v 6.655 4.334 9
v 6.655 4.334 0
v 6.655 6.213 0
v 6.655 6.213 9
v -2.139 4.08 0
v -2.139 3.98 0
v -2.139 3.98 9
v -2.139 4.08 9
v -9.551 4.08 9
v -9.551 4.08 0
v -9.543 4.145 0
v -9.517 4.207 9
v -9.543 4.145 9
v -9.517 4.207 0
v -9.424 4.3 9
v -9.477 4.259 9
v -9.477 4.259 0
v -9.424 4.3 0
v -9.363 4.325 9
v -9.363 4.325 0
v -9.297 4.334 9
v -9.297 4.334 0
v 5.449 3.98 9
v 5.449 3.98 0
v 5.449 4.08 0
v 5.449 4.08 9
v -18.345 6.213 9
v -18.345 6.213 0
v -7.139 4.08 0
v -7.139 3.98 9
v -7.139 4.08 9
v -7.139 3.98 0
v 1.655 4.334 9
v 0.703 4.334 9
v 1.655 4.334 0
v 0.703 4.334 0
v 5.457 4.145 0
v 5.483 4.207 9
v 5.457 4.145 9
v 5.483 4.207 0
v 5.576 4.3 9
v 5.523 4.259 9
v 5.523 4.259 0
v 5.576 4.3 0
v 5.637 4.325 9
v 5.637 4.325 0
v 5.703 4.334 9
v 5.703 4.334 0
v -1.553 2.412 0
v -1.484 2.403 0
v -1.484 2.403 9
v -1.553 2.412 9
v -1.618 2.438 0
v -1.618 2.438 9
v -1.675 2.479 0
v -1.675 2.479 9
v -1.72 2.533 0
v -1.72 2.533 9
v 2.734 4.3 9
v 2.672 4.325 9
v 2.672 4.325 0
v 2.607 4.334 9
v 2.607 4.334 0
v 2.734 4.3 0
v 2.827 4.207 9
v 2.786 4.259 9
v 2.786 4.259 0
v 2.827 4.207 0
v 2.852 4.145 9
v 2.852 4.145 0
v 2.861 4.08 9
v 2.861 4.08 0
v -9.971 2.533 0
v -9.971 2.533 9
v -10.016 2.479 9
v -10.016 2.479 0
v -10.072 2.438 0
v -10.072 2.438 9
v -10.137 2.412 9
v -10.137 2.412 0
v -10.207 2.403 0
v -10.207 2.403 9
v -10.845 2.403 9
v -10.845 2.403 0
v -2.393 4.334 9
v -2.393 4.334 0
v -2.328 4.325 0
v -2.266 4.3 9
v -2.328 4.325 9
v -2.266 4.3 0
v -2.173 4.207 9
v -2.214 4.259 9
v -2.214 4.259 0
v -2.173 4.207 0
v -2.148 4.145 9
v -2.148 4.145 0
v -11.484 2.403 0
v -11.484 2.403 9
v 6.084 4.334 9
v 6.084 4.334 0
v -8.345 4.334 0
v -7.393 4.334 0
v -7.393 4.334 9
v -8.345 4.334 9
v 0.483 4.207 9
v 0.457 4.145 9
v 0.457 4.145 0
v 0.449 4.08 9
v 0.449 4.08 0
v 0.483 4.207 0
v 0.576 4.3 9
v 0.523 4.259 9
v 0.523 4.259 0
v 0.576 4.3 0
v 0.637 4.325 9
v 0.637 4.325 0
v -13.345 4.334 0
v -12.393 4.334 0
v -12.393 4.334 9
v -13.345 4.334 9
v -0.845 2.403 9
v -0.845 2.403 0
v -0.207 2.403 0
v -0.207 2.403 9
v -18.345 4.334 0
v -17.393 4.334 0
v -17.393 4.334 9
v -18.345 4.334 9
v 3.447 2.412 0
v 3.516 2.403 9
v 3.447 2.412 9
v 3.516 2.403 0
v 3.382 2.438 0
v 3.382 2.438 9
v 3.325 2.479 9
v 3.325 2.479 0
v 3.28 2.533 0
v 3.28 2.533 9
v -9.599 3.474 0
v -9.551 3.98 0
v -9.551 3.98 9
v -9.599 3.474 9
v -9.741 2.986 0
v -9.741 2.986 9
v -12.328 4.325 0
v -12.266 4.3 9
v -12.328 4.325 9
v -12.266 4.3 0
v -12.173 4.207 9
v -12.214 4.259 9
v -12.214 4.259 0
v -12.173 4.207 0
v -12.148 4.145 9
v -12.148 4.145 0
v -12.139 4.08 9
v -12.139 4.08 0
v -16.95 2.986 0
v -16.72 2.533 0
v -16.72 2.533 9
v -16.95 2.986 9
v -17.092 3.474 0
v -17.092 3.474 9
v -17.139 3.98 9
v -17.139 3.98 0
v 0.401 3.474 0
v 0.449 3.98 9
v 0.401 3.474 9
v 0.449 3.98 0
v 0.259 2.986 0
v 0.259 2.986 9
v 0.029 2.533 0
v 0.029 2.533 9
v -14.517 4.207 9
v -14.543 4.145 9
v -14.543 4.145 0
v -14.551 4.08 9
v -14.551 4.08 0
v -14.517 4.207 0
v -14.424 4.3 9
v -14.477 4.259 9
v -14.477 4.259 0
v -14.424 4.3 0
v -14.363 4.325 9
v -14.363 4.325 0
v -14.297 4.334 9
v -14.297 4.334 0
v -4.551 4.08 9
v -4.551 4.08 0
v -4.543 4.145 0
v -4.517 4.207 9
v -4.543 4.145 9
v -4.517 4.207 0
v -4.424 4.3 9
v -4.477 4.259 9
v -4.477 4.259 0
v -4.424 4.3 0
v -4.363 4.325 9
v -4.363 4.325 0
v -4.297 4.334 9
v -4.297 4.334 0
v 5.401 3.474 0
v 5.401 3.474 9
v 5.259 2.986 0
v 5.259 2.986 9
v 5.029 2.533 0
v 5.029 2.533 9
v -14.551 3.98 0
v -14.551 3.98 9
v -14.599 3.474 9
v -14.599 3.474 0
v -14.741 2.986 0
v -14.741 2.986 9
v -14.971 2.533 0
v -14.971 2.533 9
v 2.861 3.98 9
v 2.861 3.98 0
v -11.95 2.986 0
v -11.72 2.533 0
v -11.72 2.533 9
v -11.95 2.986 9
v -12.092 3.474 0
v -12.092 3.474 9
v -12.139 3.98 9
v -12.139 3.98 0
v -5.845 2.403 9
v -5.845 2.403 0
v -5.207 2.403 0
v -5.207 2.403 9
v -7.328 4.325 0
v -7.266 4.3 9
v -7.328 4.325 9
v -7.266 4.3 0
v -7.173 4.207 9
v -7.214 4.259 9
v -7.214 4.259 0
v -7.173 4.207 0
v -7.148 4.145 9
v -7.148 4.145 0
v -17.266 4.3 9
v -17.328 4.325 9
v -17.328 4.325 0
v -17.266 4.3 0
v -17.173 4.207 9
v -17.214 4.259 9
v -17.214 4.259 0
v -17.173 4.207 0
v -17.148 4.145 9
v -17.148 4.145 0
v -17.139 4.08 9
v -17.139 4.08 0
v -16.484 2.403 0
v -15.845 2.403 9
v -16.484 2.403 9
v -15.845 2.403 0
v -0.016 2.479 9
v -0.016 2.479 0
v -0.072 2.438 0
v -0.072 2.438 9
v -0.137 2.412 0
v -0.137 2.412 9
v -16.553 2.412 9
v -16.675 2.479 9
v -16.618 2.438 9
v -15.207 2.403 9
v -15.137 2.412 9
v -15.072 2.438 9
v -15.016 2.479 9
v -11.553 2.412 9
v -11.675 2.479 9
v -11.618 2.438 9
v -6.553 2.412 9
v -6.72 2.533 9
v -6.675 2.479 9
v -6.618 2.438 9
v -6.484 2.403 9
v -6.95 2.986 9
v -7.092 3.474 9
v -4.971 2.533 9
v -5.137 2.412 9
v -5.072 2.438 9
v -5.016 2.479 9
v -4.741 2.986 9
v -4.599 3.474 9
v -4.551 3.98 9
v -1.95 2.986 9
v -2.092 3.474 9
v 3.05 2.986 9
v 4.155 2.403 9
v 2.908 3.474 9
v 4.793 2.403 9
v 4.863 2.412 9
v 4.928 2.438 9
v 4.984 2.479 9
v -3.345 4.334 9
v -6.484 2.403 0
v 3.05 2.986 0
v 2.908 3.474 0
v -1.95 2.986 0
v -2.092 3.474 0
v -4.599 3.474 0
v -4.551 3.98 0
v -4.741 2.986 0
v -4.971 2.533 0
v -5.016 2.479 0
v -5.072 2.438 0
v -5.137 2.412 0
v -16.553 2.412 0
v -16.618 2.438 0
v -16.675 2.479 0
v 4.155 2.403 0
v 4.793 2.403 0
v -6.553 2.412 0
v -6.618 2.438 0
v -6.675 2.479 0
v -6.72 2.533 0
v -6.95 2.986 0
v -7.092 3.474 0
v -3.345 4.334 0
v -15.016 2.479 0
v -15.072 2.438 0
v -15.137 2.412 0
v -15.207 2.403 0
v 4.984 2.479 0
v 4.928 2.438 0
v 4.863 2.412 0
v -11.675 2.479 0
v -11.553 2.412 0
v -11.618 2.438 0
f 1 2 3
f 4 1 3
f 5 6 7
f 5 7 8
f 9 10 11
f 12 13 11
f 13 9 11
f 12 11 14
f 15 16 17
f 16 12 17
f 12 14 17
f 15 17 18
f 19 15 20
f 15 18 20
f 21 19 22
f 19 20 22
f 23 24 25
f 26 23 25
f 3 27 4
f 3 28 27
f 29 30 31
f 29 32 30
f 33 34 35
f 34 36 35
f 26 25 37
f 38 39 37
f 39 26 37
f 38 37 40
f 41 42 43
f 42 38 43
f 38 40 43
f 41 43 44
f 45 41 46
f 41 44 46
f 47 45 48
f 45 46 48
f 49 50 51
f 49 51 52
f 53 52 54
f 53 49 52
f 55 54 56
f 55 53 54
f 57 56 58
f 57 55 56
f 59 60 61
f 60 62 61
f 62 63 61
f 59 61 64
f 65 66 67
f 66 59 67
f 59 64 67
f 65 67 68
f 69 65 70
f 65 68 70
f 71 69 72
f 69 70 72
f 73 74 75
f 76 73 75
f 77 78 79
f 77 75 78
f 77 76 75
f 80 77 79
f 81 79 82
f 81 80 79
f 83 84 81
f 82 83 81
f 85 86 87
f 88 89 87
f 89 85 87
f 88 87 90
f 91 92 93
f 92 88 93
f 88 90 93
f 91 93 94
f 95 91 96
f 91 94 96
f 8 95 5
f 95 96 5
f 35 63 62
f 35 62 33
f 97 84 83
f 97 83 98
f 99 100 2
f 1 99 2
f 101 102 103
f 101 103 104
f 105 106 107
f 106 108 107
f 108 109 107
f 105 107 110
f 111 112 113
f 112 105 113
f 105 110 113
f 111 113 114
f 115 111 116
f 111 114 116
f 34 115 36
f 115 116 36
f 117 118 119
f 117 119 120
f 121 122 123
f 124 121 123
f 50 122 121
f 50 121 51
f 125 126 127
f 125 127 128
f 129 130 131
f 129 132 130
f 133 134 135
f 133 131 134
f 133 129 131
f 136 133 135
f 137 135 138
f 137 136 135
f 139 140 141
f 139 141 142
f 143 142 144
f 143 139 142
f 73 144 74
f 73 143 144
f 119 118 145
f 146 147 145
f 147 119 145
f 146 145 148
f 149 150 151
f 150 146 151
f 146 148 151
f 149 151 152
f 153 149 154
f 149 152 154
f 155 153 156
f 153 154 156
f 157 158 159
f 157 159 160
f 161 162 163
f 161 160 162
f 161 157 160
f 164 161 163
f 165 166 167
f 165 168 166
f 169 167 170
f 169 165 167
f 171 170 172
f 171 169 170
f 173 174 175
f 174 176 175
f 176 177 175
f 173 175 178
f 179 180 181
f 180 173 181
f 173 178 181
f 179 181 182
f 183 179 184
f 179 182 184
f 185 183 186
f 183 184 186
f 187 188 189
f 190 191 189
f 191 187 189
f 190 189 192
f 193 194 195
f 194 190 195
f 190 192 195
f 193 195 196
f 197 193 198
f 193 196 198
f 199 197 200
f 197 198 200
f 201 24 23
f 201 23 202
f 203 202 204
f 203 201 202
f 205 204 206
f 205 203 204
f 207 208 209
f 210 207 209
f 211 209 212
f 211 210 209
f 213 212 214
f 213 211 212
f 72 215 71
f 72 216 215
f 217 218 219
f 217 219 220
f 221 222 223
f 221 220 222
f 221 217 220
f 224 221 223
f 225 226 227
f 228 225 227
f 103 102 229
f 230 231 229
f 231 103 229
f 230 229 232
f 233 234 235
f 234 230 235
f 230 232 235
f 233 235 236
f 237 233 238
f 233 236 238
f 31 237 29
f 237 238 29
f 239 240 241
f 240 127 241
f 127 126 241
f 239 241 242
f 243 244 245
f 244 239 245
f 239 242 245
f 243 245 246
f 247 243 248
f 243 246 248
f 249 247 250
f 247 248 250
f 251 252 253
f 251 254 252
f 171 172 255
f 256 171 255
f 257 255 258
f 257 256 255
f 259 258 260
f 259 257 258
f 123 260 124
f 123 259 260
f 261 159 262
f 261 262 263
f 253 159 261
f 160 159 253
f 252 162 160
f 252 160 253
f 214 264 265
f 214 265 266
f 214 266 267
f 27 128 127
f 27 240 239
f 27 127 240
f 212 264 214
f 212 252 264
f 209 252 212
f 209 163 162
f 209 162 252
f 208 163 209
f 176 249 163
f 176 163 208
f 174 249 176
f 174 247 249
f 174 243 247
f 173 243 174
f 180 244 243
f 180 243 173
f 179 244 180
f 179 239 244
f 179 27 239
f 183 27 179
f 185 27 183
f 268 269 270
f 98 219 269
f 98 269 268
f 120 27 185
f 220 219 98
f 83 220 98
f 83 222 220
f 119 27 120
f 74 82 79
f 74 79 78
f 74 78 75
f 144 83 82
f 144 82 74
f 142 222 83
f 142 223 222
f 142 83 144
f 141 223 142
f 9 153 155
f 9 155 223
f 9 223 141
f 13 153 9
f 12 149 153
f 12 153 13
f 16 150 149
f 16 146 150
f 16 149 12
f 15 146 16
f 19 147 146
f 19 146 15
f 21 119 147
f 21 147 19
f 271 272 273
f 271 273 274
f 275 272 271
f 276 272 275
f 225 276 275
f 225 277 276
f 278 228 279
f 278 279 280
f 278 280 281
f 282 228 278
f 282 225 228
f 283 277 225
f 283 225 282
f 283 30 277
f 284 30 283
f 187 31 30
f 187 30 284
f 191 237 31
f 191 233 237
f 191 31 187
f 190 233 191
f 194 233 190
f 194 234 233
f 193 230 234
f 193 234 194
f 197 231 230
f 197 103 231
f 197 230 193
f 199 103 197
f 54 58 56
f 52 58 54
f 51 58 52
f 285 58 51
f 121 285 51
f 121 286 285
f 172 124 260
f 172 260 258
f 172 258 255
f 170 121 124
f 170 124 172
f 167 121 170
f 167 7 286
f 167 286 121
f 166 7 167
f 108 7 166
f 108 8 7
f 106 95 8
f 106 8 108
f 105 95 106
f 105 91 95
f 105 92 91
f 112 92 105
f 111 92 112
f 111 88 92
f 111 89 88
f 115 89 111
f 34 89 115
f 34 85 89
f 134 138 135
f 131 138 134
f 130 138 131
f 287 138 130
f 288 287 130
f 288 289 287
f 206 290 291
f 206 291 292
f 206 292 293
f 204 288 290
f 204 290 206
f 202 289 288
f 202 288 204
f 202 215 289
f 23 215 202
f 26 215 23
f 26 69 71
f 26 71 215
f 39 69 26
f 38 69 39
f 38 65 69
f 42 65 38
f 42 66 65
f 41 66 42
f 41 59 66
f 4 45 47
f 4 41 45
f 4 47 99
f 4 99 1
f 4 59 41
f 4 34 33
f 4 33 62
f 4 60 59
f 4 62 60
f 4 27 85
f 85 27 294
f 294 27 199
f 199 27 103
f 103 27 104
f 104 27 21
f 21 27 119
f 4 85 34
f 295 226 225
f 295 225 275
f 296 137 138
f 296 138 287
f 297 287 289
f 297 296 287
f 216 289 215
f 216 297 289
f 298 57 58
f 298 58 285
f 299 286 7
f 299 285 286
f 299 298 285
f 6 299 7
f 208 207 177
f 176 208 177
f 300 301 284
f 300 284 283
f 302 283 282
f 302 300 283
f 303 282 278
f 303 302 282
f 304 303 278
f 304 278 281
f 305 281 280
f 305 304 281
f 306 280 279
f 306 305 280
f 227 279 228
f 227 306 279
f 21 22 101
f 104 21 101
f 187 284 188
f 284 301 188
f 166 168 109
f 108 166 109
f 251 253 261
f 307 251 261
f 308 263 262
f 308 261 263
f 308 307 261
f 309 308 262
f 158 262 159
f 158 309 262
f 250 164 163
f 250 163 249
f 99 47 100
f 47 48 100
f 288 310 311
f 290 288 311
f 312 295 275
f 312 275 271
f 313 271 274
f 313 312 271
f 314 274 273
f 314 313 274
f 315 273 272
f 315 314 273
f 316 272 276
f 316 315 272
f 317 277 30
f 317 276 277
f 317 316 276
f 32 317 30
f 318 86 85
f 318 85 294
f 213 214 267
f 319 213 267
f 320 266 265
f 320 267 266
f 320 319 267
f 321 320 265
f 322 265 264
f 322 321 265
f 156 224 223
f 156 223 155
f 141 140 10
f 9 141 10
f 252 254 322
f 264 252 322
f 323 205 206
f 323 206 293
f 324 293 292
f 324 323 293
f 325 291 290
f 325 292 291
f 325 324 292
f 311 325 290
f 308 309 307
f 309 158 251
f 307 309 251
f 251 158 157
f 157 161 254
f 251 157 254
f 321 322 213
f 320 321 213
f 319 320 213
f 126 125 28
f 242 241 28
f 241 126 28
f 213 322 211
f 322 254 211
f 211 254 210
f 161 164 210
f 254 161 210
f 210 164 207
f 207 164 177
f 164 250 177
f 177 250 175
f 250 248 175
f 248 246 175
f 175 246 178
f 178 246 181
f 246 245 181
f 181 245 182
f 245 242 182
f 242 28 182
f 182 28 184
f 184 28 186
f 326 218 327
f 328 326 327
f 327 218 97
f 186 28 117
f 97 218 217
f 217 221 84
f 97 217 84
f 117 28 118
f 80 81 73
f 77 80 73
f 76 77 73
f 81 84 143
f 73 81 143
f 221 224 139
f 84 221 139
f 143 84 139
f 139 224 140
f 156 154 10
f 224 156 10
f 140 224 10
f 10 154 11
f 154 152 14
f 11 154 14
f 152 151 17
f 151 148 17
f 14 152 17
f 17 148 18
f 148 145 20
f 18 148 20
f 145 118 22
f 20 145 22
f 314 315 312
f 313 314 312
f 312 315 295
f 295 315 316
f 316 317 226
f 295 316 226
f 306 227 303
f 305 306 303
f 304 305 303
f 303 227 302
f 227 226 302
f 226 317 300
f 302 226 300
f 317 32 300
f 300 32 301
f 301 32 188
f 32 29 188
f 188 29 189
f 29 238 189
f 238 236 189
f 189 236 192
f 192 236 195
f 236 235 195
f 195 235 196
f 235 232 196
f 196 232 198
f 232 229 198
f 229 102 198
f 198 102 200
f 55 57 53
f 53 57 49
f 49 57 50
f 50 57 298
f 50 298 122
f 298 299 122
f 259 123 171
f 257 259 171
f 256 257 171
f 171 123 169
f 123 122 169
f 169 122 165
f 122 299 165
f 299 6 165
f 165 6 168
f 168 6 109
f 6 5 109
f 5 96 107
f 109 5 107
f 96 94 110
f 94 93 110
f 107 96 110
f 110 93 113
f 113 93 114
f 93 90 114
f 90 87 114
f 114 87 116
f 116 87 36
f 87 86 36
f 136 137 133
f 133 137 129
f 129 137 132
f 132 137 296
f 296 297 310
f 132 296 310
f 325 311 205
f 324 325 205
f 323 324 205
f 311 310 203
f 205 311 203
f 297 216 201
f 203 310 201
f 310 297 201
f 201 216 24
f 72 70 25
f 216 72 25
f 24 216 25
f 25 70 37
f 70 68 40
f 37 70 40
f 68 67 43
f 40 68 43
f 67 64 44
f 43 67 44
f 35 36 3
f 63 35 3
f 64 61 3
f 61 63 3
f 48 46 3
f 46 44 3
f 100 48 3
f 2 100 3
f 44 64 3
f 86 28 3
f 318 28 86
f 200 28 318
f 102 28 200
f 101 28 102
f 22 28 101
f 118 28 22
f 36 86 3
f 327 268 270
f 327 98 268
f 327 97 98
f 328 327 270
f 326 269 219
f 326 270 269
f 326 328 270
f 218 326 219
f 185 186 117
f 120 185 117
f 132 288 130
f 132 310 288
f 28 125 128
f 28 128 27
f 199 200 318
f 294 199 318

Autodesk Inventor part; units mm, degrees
ref_plane "YZ Plane" through (0, 0, 0) normal (1, 0, 0) x (0, 1, 0)
ref_plane "XZ Plane" through (0, 0, 0) normal (0, 1, 0) x (-1, 0, 0)
ref_plane "XY Plane" through (0, 0, 0) normal (0, 0, 1) x (1, 0, 0)
sketch "Sketch1" plane through (0, 0, 0) normal (0, 0, 1) x (1, 0, 0)
  line L0 (-14.2973, 4.3336) -> (-13.3453, 4.3336)
  line L1 (-18.3453, 6.2132) -> (6.6546, 6.2132)
  arc A0 (-14.971, 2.5331) -> (-14.5513, 3.9796) centre (-17.2541, 3.9796) ccw
  arc A1 (-17.1394, 3.9796) -> (-16.7197, 2.5331) centre (-14.4366, 3.9796) ccw
  arc A2 (-15.207, 2.4032) -> (-14.971, 2.5331) centre (-15.207, 2.6826) ccw
  arc A3 (-16.7197, 2.5331) -> (-16.4837, 2.4032) centre (-16.4837, 2.6826) ccw
  line L2 (-15.8453, 2.4032) -> (-15.207, 2.4032)
  line L3 (-15.8453, 2.4032) -> (-16.4837, 2.4032)
  arc A4 (-14.2973, 4.3336) -> (-14.5513, 4.0796) centre (-14.2973, 4.0796) ccw
  arc A5 (-17.1394, 4.0796) -> (-17.3934, 4.3336) centre (-17.3934, 4.0796) ccw
  line L4 (-18.3453, 4.3336) -> (-18.3453, 6.2132)
  line L5 (-14.5513, 3.9796) -> (-14.5513, 4.0796)
  line L6 (-17.3934, 4.3336) -> (-18.3453, 4.3336)
  line L7 (-17.1394, 3.9796) -> (-17.1394, 4.0796)
  arc A6 (5.029, 2.5331) -> (5.4487, 3.9796) centre (2.7459, 3.9796) ccw
  arc A7 (2.8606, 3.9796) -> (3.2803, 2.5331) centre (5.5634, 3.9796) ccw
  arc A8 (0.029, 2.5331) -> (0.4487, 3.9796) centre (-2.2541, 3.9796) ccw
  arc A9 (-2.1394, 3.9796) -> (-1.7197, 2.5331) centre (0.5634, 3.9796) ccw
  arc A10 (-4.971, 2.5331) -> (-4.5513, 3.9796) centre (-7.2541, 3.9796) ccw
  arc A11 (-7.1394, 3.9796) -> (-6.7197, 2.5331) centre (-4.4366, 3.9796) ccw
  arc A12 (-9.971, 2.5331) -> (-9.5513, 3.9796) centre (-12.2541, 3.9796) ccw
  arc A13 (-12.1394, 3.9796) -> (-11.7197, 2.5331) centre (-9.4366, 3.9796) ccw
  arc A14 (-10.207, 2.4032) -> (-9.971, 2.5331) centre (-10.207, 2.6826) ccw
  line L8 (-10.8453, 2.4032) -> (-10.207, 2.4032)
  arc A15 (-11.7197, 2.5331) -> (-11.4837, 2.4032) centre (-11.4837, 2.6826) ccw
  line L9 (-10.8453, 2.4032) -> (-11.4837, 2.4032)
  arc A16 (-5.207, 2.4032) -> (-4.971, 2.5331) centre (-5.207, 2.6826) ccw
  line L10 (-5.8453, 2.4032) -> (-5.207, 2.4032)
  arc A17 (-6.7197, 2.5331) -> (-6.4837, 2.4032) centre (-6.4837, 2.6826) ccw
  line L11 (-5.8453, 2.4032) -> (-6.4837, 2.4032)
  arc A18 (-0.207, 2.4032) -> (0.029, 2.5331) centre (-0.207, 2.6826) ccw
  line L12 (-0.8454, 2.4032) -> (-0.207, 2.4032)
  arc A19 (-1.7197, 2.5331) -> (-1.4837, 2.4032) centre (-1.4837, 2.6826) ccw
  line L13 (-0.8454, 2.4032) -> (-1.4837, 2.4032)
  arc A20 (4.793, 2.4032) -> (5.029, 2.5331) centre (4.793, 2.6826) ccw
  line L14 (4.1546, 2.4032) -> (4.793, 2.4032)
  arc A21 (3.2803, 2.5331) -> (3.5163, 2.4032) centre (3.5163, 2.6826) ccw
  line L15 (4.1546, 2.4032) -> (3.5163, 2.4032)
  line L16 (-2.3934, 4.3336) -> (-3.3454, 4.3336)
  line L17 (-9.2973, 4.3336) -> (-8.3453, 4.3336)
  line L18 (-9.5513, 3.9796) -> (-9.5513, 4.0796)
  arc A22 (-9.2973, 4.3336) -> (-9.5513, 4.0796) centre (-9.2973, 4.0796) ccw
  line L19 (-12.1394, 3.9796) -> (-12.1394, 4.0796)
  arc A23 (-12.1394, 4.0796) -> (-12.3934, 4.3336) centre (-12.3934, 4.0796) ccw
  line L20 (-12.3934, 4.3336) -> (-13.3453, 4.3336)
  line L21 (-4.5513, 3.9796) -> (-4.5513, 4.0796)
  arc A24 (-4.2973, 4.3336) -> (-4.5513, 4.0796) centre (-4.2973, 4.0796) ccw
  line L22 (-4.2973, 4.3336) -> (-3.3454, 4.3336)
  line L23 (-7.1394, 3.9796) -> (-7.1394, 4.0796)
  arc A25 (-7.1394, 4.0796) -> (-7.3934, 4.3336) centre (-7.3934, 4.0796) ccw
  line L24 (-7.3934, 4.3336) -> (-8.3453, 4.3336)
  line L25 (2.6066, 4.3336) -> (1.6546, 4.3336)
  line L26 (0.4487, 3.9796) -> (0.4487, 4.0796)
  arc A26 (0.7027, 4.3336) -> (0.4487, 4.0796) centre (0.7027, 4.0796) ccw
  line L27 (0.7027, 4.3336) -> (1.6546, 4.3336)
  line L28 (-2.1394, 3.9796) -> (-2.1394, 4.0796)
  arc A27 (-2.1394, 4.0796) -> (-2.3934, 4.3336) centre (-2.3934, 4.0796) ccw
  line L29 (5.4487, 3.9796) -> (5.4487, 4.0796)
  arc A28 (5.7027, 4.3336) -> (5.4487, 4.0796) centre (5.7027, 4.0796) ccw
  line L30 (5.7027, 4.3336) -> (6.6546, 4.3336)
  line L31 (2.8606, 3.9796) -> (2.8606, 4.0796)
  arc A29 (2.8606, 4.0796) -> (2.6066, 4.3336) centre (2.6066, 4.0796) ccw
  line L32 (6.6546, 4.3336) -> (6.6546, 6.2132)
  line L33 (6.0839, 4.3336) -> (6.6546, 4.3336)
  dimension "d2" = 5
  dimension "d3" = 3.81
  dimension "d4" = 1.9304
extrude "Extrusion1" add sketch "Sketch1" along normal blind 9
properties part number "5MR-535-09"
